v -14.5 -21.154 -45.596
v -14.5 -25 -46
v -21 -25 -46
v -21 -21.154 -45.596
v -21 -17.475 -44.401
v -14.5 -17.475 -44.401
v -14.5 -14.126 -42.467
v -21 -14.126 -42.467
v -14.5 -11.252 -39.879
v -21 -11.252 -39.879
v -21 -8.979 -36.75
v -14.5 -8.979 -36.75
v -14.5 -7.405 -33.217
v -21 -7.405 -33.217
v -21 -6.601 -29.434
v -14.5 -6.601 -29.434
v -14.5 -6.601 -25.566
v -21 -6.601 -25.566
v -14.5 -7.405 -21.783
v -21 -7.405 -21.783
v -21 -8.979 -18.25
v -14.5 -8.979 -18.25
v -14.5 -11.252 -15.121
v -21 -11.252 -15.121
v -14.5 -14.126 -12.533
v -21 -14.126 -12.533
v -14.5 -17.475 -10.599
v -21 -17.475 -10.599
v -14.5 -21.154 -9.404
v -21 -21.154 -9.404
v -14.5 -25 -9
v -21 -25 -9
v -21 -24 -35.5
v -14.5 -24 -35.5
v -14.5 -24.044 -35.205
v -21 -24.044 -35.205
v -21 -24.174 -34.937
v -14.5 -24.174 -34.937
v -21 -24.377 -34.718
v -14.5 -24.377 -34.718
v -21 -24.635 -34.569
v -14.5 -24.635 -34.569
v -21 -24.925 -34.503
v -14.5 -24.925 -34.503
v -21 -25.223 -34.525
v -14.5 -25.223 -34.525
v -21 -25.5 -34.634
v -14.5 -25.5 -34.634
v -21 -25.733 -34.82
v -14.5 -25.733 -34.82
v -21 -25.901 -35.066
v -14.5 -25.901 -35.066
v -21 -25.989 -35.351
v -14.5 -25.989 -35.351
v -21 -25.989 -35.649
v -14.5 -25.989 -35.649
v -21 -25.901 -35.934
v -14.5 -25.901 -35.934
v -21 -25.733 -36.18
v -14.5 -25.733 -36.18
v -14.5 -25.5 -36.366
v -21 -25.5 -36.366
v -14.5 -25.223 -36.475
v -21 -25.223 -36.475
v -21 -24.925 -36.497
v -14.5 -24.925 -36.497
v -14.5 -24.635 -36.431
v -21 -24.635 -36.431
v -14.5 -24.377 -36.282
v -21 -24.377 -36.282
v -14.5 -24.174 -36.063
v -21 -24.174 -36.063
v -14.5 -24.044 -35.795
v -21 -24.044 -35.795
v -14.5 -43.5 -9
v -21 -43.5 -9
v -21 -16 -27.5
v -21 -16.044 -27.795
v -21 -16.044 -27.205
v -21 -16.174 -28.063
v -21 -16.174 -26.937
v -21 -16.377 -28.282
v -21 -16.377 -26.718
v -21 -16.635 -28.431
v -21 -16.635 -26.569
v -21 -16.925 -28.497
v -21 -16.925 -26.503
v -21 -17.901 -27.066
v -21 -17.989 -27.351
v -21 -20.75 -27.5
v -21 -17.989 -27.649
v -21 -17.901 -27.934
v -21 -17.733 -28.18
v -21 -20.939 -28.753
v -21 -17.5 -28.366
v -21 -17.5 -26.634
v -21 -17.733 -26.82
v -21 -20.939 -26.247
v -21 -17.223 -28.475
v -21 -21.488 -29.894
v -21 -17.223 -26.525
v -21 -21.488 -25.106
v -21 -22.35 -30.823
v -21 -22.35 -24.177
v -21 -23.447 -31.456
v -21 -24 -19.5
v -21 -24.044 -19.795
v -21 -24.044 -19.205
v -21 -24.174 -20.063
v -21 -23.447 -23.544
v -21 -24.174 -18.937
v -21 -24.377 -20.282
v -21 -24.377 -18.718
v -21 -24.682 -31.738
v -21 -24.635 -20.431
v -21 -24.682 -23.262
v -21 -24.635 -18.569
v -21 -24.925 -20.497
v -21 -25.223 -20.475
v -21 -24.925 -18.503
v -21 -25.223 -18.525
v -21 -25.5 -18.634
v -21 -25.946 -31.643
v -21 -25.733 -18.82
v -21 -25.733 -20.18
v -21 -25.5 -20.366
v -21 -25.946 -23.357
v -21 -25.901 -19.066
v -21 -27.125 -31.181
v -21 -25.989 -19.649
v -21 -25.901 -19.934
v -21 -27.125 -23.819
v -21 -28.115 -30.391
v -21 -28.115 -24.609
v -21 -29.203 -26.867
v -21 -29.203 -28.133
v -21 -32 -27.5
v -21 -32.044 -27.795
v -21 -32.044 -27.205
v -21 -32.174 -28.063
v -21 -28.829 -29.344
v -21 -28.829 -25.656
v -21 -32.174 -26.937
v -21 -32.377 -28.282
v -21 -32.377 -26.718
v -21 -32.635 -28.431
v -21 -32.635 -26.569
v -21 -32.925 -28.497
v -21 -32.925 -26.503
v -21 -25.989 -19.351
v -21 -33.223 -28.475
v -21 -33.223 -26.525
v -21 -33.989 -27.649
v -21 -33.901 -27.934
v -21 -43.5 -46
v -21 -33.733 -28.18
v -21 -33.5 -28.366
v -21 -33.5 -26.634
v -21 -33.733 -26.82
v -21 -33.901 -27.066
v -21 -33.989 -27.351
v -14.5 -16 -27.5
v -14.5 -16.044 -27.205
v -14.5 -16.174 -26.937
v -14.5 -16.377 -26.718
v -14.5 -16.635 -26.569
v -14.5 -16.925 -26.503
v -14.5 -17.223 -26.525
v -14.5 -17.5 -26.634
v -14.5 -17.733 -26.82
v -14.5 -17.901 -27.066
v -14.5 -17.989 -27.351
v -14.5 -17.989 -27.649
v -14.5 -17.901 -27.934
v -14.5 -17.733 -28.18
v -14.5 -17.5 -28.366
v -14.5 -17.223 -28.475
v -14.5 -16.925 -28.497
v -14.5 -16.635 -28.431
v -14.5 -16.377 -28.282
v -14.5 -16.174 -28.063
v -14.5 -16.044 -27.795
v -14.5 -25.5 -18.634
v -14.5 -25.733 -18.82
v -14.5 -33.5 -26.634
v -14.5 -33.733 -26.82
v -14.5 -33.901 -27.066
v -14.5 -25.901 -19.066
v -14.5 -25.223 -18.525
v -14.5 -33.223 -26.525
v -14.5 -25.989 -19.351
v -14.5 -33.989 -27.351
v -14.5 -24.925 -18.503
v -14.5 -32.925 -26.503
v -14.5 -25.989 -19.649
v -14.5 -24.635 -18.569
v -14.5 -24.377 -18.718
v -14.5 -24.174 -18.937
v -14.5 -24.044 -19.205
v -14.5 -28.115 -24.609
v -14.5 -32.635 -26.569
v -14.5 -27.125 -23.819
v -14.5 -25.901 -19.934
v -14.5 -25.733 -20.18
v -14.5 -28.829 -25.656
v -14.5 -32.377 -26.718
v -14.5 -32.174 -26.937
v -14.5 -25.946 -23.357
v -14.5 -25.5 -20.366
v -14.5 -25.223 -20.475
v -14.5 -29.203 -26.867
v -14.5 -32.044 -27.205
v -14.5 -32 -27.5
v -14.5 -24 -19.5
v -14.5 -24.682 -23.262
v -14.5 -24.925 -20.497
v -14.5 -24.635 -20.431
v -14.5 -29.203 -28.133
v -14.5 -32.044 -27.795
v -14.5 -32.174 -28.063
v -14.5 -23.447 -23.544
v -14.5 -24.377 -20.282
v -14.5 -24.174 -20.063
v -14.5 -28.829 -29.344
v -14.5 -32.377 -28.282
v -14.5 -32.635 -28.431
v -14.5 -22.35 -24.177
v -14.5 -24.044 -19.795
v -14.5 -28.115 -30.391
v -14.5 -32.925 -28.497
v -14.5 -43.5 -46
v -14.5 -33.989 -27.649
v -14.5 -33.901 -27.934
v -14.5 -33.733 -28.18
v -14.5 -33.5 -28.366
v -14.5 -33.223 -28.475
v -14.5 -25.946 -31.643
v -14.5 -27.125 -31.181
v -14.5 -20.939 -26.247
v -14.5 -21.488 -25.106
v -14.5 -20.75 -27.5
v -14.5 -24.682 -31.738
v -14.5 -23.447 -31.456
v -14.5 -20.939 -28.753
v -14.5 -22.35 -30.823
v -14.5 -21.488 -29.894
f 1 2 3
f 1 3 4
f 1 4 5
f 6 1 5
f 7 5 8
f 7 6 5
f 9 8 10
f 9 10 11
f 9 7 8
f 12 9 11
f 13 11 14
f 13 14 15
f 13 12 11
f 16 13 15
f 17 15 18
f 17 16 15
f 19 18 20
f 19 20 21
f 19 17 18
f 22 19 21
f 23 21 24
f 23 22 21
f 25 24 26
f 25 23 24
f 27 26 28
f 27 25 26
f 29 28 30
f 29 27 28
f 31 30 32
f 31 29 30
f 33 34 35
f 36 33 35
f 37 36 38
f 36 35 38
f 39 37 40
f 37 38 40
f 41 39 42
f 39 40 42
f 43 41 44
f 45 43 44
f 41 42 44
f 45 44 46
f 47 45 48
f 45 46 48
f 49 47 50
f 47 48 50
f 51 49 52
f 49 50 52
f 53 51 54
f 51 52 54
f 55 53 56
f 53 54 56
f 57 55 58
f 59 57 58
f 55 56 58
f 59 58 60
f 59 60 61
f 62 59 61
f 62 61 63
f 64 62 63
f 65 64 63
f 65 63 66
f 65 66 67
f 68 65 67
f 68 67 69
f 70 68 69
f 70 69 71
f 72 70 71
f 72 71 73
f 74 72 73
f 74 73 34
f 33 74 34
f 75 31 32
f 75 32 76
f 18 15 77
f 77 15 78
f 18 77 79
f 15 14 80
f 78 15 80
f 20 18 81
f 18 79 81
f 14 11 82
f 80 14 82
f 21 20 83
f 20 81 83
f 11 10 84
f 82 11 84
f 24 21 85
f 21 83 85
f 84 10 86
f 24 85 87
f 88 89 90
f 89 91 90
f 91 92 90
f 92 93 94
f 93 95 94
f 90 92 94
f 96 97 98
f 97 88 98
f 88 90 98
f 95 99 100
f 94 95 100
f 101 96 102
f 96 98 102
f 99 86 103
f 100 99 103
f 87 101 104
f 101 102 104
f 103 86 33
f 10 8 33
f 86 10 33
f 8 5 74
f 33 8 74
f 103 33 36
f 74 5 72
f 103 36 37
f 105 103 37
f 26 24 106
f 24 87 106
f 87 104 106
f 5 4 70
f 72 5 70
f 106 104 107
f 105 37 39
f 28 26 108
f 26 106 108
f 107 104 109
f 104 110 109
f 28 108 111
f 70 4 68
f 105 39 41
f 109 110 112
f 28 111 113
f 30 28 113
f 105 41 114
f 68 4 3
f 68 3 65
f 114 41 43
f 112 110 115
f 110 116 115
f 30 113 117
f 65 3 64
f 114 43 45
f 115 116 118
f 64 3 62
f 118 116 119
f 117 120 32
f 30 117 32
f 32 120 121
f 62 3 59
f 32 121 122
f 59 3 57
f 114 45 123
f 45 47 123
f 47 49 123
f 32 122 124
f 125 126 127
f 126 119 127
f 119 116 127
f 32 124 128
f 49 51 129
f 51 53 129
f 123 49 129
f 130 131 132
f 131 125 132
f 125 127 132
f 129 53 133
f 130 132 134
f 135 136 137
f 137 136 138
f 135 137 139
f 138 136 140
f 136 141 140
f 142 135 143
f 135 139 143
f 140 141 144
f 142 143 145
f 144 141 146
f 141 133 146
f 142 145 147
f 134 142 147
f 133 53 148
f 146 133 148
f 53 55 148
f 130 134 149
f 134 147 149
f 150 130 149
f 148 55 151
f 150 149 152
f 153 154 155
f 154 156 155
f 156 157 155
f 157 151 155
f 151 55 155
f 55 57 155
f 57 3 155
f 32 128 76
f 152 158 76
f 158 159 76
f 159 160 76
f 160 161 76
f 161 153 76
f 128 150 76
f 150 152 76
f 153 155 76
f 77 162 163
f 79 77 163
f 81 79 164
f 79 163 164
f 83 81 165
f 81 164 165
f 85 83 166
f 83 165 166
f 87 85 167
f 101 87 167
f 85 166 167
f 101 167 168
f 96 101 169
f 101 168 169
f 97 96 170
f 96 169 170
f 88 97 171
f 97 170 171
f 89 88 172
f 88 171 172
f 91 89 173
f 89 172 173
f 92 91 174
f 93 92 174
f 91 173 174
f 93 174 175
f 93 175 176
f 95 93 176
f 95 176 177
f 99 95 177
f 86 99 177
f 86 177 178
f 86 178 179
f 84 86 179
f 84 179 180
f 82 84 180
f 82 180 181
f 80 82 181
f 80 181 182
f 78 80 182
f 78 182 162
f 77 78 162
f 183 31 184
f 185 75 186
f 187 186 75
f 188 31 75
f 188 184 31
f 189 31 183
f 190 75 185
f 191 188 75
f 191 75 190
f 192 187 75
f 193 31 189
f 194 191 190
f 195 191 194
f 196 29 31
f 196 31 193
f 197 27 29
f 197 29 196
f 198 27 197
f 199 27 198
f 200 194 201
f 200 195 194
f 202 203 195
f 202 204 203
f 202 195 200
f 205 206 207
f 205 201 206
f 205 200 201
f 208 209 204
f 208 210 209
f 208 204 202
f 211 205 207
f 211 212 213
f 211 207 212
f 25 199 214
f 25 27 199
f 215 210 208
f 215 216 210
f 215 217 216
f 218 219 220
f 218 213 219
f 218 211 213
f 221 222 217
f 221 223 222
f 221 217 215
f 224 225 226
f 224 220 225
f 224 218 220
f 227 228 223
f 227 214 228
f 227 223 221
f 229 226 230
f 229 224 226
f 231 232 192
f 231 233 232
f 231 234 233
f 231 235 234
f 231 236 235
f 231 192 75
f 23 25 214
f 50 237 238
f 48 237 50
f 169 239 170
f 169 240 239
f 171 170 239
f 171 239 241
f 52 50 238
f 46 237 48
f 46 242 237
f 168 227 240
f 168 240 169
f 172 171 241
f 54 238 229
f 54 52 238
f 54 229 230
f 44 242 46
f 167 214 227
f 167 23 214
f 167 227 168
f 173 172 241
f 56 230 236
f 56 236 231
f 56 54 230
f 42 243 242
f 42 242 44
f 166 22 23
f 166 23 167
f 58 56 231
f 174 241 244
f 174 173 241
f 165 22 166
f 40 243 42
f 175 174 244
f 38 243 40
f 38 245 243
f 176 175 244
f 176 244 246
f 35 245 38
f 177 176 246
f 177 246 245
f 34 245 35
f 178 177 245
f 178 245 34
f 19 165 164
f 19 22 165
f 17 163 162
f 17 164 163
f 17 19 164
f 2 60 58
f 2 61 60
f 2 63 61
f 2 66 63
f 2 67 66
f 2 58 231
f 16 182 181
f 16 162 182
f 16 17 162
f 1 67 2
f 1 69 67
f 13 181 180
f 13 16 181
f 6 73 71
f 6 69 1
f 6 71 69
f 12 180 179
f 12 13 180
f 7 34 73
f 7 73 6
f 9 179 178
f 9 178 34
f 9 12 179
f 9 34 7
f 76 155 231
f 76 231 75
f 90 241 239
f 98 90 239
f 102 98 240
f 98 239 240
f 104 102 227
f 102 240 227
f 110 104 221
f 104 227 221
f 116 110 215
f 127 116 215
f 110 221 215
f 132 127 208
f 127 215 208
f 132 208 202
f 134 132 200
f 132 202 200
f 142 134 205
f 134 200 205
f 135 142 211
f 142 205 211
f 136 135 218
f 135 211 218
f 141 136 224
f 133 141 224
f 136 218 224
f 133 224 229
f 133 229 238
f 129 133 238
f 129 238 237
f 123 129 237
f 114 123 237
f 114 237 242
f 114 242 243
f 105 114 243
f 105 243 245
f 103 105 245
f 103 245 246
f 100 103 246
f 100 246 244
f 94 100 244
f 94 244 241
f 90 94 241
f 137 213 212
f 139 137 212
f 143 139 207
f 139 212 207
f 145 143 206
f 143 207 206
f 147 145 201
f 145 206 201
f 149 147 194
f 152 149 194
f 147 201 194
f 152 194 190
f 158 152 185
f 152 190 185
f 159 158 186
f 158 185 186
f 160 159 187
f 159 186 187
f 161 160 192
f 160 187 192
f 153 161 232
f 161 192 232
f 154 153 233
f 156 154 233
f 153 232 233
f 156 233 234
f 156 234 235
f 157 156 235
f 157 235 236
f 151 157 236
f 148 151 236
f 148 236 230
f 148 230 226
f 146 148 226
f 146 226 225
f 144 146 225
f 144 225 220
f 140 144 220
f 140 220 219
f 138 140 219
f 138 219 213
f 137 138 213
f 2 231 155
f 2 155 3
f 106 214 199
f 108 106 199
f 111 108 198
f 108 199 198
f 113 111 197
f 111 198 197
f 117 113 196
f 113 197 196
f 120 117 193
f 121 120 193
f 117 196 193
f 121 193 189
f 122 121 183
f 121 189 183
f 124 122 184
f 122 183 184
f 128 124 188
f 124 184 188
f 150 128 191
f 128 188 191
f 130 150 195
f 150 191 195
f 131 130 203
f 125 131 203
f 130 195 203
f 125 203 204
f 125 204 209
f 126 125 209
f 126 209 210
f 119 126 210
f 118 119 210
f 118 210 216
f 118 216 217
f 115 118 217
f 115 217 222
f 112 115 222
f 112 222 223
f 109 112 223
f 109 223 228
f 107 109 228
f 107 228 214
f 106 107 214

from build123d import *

# Parameters (mm, degrees)
SKETCH1_W               = 50
SKETCH1_H               = 150
BOSS_EXTRUDE1_DEPTH     = 55
CUT_EXTRUDE1_DEPTH      = 168.406690428
CUT_EXTRUDE1_DEPTH_BACK = 45
SKETCH2_R               = 10.25
SKETCH7_R               = 1
SKETCH7_R_2             = 4.25
CUT_EXTRUDE3_DEPTH      = 10
SKETCH8_W               = 55
SKETCH8_H               = 55
SKETCH8_R               = 10.25
BOSS_EXTRUDE2_DEPTH     = 50
SKETCH10_W              = 8
SKETCH10_H              = 10.25
SKETCH10_W_2            = 17
SKETCH10_H_2            = 1
SKETCH10_W_3            = 34
SKETCH10_H_3            = 20
SKETCH10_H_4            = 5
CUT_EXTRUDE4_DEPTH      = 214.717102732
SKETCH11_W              = 34
SKETCH11_H              = 13.25
BOSS_EXTRUDE4_DEPTH     = 25
SKETCH13_W              = 55
SKETCH13_H              = 10
CUT_EXTRUDE5_DEPTH      = 8
SKETCH14_R              = 5.030159043
CUT_EXTRUDE6_DEPTH      = 8
SKETCH15_W              = 34
SKETCH15_H              = 0.25
BOSS_EXTRUDE5_DEPTH     = 13.25
CUT_EXTRUDE7_DEPTH      = 181.416185527
BOSS_EXTRUDE6_START     = 1.5
SKETCH19_R              = 10.25
SKETCH19_R_2            = 1
SKETCH19_R_3            = 4.25
BOSS_EXTRUDE6_DEPTH     = 1.5
CUT_EXTRUDE8_DEPTH      = 184.89467094
SKETCH21_R              = 5.030159043
SKETCH21_R_2            = 4.5
BOSS_EXTRUDE7_DEPTH     = 8
SKETCH24_W              = 4
SKETCH24_H              = 30
CUT_EXTRUDE10_DEPTH     = 181.416185527
SKETCH25_W              = 55
SKETCH25_H              = 86.25
CUT_EXTRUDE11_DEPTH     = 4
BOSS_EXTRUDE8_START     = 4
SKETCH26_R              = 1
SKETCH26_R_2            = 4.25
BOSS_EXTRUDE8_DEPTH     = 4
SKETCH27_W              = 4
SKETCH27_H              = 123.25
CUT_EXTRUDE12_DEPTH     = 181.416185527
CUT_EXTRUDE13_DEPTH     = 180.905530765
SKETCH29_W              = 42
SKETCH29_H              = 9
CUT_EXTRUDE15_DEPTH     = 174.776436838
SKETCH30_R              = 4.5
SKETCH30_R_2            = 1.45
BOSS_EXTRUDE9_DEPTH     = 4
SKETCH31_W              = 37
SKETCH31_H              = 55
CUT_EXTRUDE16_DEPTH     = 182.05247858
SKETCH32_W              = 73.968301754
SKETCH32_H              = 92.223299302
CUT_EXTRUDE17_DEPTH     = 182.05247858


with BuildPart() as part:
    # Sketch1 → Boss-Extrude1 (new body)
    with BuildSketch(Plane.XY):
        with Locations((0, -75)):
            Rectangle(SKETCH1_W, SKETCH1_H)
    extrude(amount=-BOSS_EXTRUDE1_DEPTH)

    # Sketch2 → Cut-Extrude1 (cut, two sides: drawn at the far end of the back side and taken through both)
    with BuildSketch(Plane(origin=(25, 0, 0), x_dir=(0, 0, -1), z_dir=(1, 0, 0)).offset(-CUT_EXTRUDE1_DEPTH_BACK)):
        with Locations(Location((27.5, -25, 0), (0, 0, 270))):
            Circle(SKETCH2_R)
    extrude(amount=CUT_EXTRUDE1_DEPTH + CUT_EXTRUDE1_DEPTH_BACK, mode=Mode.SUBTRACT)

    # Sketch7 → Cut-Extrude3 (cut)
    with BuildSketch(Plane(origin=(-20, 0, 0), x_dir=(0, 0, -1), z_dir=(1, 0, 0))):
        with Locations(Location((27.5, -17, 0), (0, 0, 90))):
            Circle(SKETCH7_R)
        with Locations(Location((35.5, -25, 0), (0, 0, 90))):
            Circle(SKETCH7_R)
        with Locations(Location((27.5, -33, 0), (0, 0, 90))):
            Circle(SKETCH7_R)
        with Locations(Location((19.5, -25, 0), (0, 0, 90))):
            Circle(SKETCH7_R)
        with Locations(Location((27.5, -25, 0), (0, 0, 90))):
            Circle(SKETCH7_R_2)
    extrude(amount=-CUT_EXTRUDE3_DEPTH, mode=Mode.SUBTRACT)

    # Sketch8 → Boss-Extrude2 (add)
    with BuildSketch(Plane(origin=(25, 0, 0), x_dir=(0, 0, -1), z_dir=(1, 0, 0))):
        with Locations((27.5, -177.5)):
            Rectangle(SKETCH8_W, SKETCH8_H)
        with Locations(Location((27.5, -180, 0), (0, 0, 90))):
            Circle(SKETCH8_R, mode=Mode.SUBTRACT)
    extrude(amount=-BOSS_EXTRUDE2_DEPTH)

    # Sketch10 → Cut-Extrude4 (cut, through all)
    with BuildSketch(Plane.XY):
        Polygon((-17, -205), (17, -205), (17, -191.25), (0, -191.25), (-17, -191.25), align=None)
        Polygon((-25, -205), (-17, -205), (-17, -191.25), (-17, -190.25), (-25, -190.25), align=None)
        Polygon((17, -191.25), (17, -205), (25, -205), (25, -190.25), (17, -190.25), align=None)
        with Locations((-21, -185.125)):
            Rectangle(SKETCH10_W, SKETCH10_H)
        with Locations((-21, -174.875)):
            Rectangle(SKETCH10_W, SKETCH10_H)
        with Locations((21, -174.875)):
            Rectangle(SKETCH10_W, SKETCH10_H)
        with Locations((21, -185.125)):
            Rectangle(SKETCH10_W, SKETCH10_H)
        with Locations((-8.5, -185.125)):
            Rectangle(SKETCH10_W_2, SKETCH10_H)
        with Locations((8.5, -185.125)):
            Rectangle(SKETCH10_W_2, SKETCH10_H)
        Polygon((0, -180), (17, -180), (17, -169.75), (-17, -169.75), (-17, -180), align=None)
        with Locations((-8.5, -190.75)):
            Rectangle(SKETCH10_W_2, SKETCH10_H_2)
        with Locations((8.5, -190.75)):
            Rectangle(SKETCH10_W_2, SKETCH10_H_2)
        with Locations((0, -154.75)):
            Rectangle(SKETCH10_W_3, SKETCH10_H_3)
        with Locations((0, -167.25)):
            Rectangle(SKETCH10_W_3, SKETCH10_H_4)
    extrude(amount=-CUT_EXTRUDE4_DEPTH, mode=Mode.SUBTRACT)

    # Sketch11 → Boss-Extrude4 (add)
    with BuildSketch(Plane.XZ.offset(144.75)):
        with Locations((0, -6.625)):
            Rectangle(SKETCH11_W, SKETCH11_H)
        with Locations((0, -48.375)):
            Rectangle(SKETCH11_W, SKETCH11_H)
    extrude(amount=BOSS_EXTRUDE4_DEPTH)

    # Sketch13 → Cut-Extrude5 (cut)
    with BuildSketch(Plane(origin=(25, 0, 0), x_dir=(0, 0, -1), z_dir=(1, 0, 0))):
        with Locations((27.5, -164.75)):
            Rectangle(SKETCH13_W, SKETCH13_H)
    cut_extrude5 = extrude(amount=-CUT_EXTRUDE5_DEPTH, mode=Mode.SUBTRACT)

    # Mirror2: Cut-Extrude5 across plane
    add(cut_extrude5.mirror(Plane(origin=(0, 0, 0), x_dir=(0, 0, 1), z_dir=(1, 0, 0))), mode=Mode.SUBTRACT)

    # Sketch14 → Cut-Extrude6 (cut)
    with BuildSketch(Plane(origin=(25, 0, 0), x_dir=(0, 0, -1), z_dir=(1, 0, 0))):
        with Locations(Location((16.5, -148, 0), (0, 0, 90))):
            Circle(SKETCH14_R)
        with Locations(Location((38.5, -148, 0), (0, 0, 90))):
            Circle(SKETCH14_R)
    cut_extrude6 = extrude(amount=-CUT_EXTRUDE6_DEPTH, mode=Mode.SUBTRACT)

    # Mirror3: Cut-Extrude6 across plane
    add(cut_extrude6.mirror(Plane(origin=(0, 0, 0), x_dir=(0, 0, 1), z_dir=(1, 0, 0))), mode=Mode.SUBTRACT)

    # Sketch15 → Boss-Extrude5 (add)
    with BuildSketch(Plane.XY):
        with Locations((0, -169.875)):
            Rectangle(SKETCH15_W, SKETCH15_H)
    boss_extrude5 = extrude(amount=-BOSS_EXTRUDE5_DEPTH)

    # Mirror4: Boss-Extrude5 across plane
    add(boss_extrude5.mirror(Plane.XY.offset(-27.5)))

    # Sketch16 → Cut-Extrude7 (cut, through all)
    with BuildSketch(Plane.XY):
        Polygon((-18.5, 0), (-18.5, -14.75), (-18.5, -35.25), (-18.5, -43.5), (25, -43.5), (25, 0), align=None)
    extrude(amount=-CUT_EXTRUDE7_DEPTH, mode=Mode.SUBTRACT)

    # Sketch19 → Boss-Extrude6 (add)
    with BuildSketch(Plane(origin=(-20, 0, 0), x_dir=(0, 0, -1), z_dir=(1, 0, 0)).offset(BOSS_EXTRUDE6_START)):
        with Locations((27.5, -25)):
            Circle(SKETCH19_R)
        with Locations(Location((27.5, -17, 0), (0, 0, 90))):
            Circle(SKETCH19_R_2, mode=Mode.SUBTRACT)
        with Locations(Location((27.5, -33, 0), (0, 0, 90))):
            Circle(SKETCH19_R_2, mode=Mode.SUBTRACT)
        with Locations(Location((19.5, -25, 0), (0, 0, 90))):
            Circle(SKETCH19_R_2, mode=Mode.SUBTRACT)
        with Locations(Location((35.5, -25, 0), (0, 0, 90))):
            Circle(SKETCH19_R_2, mode=Mode.SUBTRACT)
        with Locations(Location((27.5, -25, 0), (0, 0, 90))):
            Circle(SKETCH19_R_3, mode=Mode.SUBTRACT)
    extrude(amount=-BOSS_EXTRUDE6_DEPTH)

    # Sketch20 → Cut-Extrude8 (cut, through all)
    with BuildSketch(Plane(origin=(-18.5, 0, 0), x_dir=(0, 0, -1), z_dir=(1, 0, 0))):
        with BuildLine():
            Line((0, 0), (0, -43.5))
            Line((0, -43.5), (9, -43.5))
            Line((9, -43.5), (9, -25))
            ThreePointArc((9, -25), (27.5, -6.5), (46, -25))
            Line((46, -25), (46, -43.5))
            Line((46, -43.5), (55, -43.5))
            Line((55, -43.5), (55, 0))
            Line((55, 0), (0, 0))
        make_face()
    extrude(amount=-CUT_EXTRUDE8_DEPTH, mode=Mode.SUBTRACT)

    # Sketch21 → Boss-Extrude7 (add)
    # profile 1 of 2: a face of its own
    with BuildSketch(Plane(origin=(25, 0, 0), x_dir=(0, 0, -1), z_dir=(1, 0, 0))):
        with Locations(Location((16.5, -148, 0), (0, 0, 229.751587581))):
            Circle(SKETCH21_R)
        with Locations(Location((16.5, -148, 0), (0, 0, 90))):
            Circle(SKETCH21_R_2, mode=Mode.SUBTRACT)
    # profile 2 of 2: a face of its own
    with BuildSketch(Plane(origin=(25, 0, 0), x_dir=(0, 0, -1), z_dir=(1, 0, 0))):
        with Locations(Location((38.5, -148, 0), (0, 0, 310.248412419))):
            Circle(SKETCH21_R)
        with Locations(Location((38.5, -148, 0), (0, 0, 90))):
            Circle(SKETCH21_R_2, mode=Mode.SUBTRACT)
    boss_extrude7 = extrude(amount=-BOSS_EXTRUDE7_DEPTH)

    # Mirror5: Boss-Extrude7 across plane
    add(boss_extrude7.mirror(Plane(origin=(0, 0, 0), x_dir=(0, 0, 1), z_dir=(1, 0, 0))))

    # Sketch24 → Cut-Extrude10 (cut, through all)
    with BuildSketch(Plane.XY):
        with Locations((-23, -144.75)):
            Rectangle(SKETCH24_W, SKETCH24_H)
        with Locations((23, -144.75)):
            Rectangle(SKETCH24_W, SKETCH24_H)
    extrude(amount=-CUT_EXTRUDE10_DEPTH, mode=Mode.SUBTRACT)

    # Sketch25 → Cut-Extrude11 (cut)
    with BuildSketch(Plane(origin=(25, 0, 0), x_dir=(0, 0, -1), z_dir=(1, 0, 0))):
        with Locations((27.5, -86.625)):
            Rectangle(SKETCH25_W, SKETCH25_H)
    extrude(amount=-CUT_EXTRUDE11_DEPTH, mode=Mode.SUBTRACT)

    # Sketch26 → Boss-Extrude8 (add)
    with BuildSketch(Plane(origin=(-18.5, 0, 0), x_dir=(0, 0, -1), z_dir=(1, 0, 0)).offset(BOSS_EXTRUDE8_START)):
        with BuildLine():
            Line((46, -43.5), (46, -25))
            ThreePointArc((46, -25), (27.5, -6.5), (9, -25))
            Line((9, -25), (9, -43.5))
            Line((9, -43.5), (46, -43.5))
        make_face()
        with Locations(Location((35.5, -25, 0), (0, 0, 90))):
            Circle(SKETCH26_R, mode=Mode.SUBTRACT)
        with Locations(Location((27.5, -25, 0), (0, 0, 90))):
            Circle(SKETCH26_R_2, mode=Mode.SUBTRACT)
        with Locations(Location((19.5, -25, 0), (0, 0, 90))):
            Circle(SKETCH26_R, mode=Mode.SUBTRACT)
        with Locations(Location((27.5, -33, 0), (0, 0, 90))):
            Circle(SKETCH26_R, mode=Mode.SUBTRACT)
        with Locations(Location((27.5, -17, 0), (0, 0, 90))):
            Circle(SKETCH26_R, mode=Mode.SUBTRACT)
    extrude(amount=-BOSS_EXTRUDE8_DEPTH)

    # Sketch27 → Cut-Extrude12 (cut, through all)
    with BuildSketch(Plane.XY):
        with Locations((-23, -68.125)):
            Rectangle(SKETCH27_W, SKETCH27_H)
    extrude(amount=-CUT_EXTRUDE12_DEPTH, mode=Mode.SUBTRACT)

    # Sketch28 → Cut-Extrude13 (cut, through all)
    with BuildSketch(Plane.XY):
        with BuildLine():
            Line((21, -43.5), (-14.5, -43.5))
            ThreePointArc((-14.5, -43.5), (10.602290732, -53.897709268), (21, -79))
            Line((21, -79), (21, -43.5))
        make_face()
    extrude(amount=-CUT_EXTRUDE13_DEPTH, mode=Mode.SUBTRACT)

    # Sketch29 → Cut-Extrude15 (cut, through all)
    with BuildSketch(Plane.XZ.offset(170)):
        with Locations((0, -50.5)):
            Rectangle(SKETCH29_W, SKETCH29_H)
        with Locations((0, -4.5)):
            Rectangle(SKETCH29_W, SKETCH29_H)
    extrude(amount=-CUT_EXTRUDE15_DEPTH, mode=Mode.SUBTRACT)

    # Sketch30 → Boss-Extrude9 (add)
    # profile 1 of 2: a face of its own
    with BuildSketch(Plane(origin=(21, 0, 0), x_dir=(0, 0, -1), z_dir=(1, 0, 0))):
        with Locations(Location((16.5, -148, 0), (0, 0, 223.761742693))):
            Circle(SKETCH30_R)
        with Locations((16.5, -148)):
            Circle(SKETCH30_R_2, mode=Mode.SUBTRACT)
    # profile 2 of 2: a face of its own
    with BuildSketch(Plane(origin=(21, 0, 0), x_dir=(0, 0, -1), z_dir=(1, 0, 0))):
        with Locations(Location((38.5, -148, 0), (0, 0, 316.238257307))):
            Circle(SKETCH30_R)
        with Locations((38.5, -148)):
            Circle(SKETCH30_R_2, mode=Mode.SUBTRACT)
    boss_extrude9 = extrude(amount=-BOSS_EXTRUDE9_DEPTH)

    # Mirror6: Boss-Extrude9 across plane
    add(boss_extrude9.mirror(Plane(origin=(0, 0, 0), x_dir=(0, 0, 1), z_dir=(1, 0, 0))))

    # Sketch31 → Cut-Extrude16 (cut, through all)
    with BuildSketch(Plane.ZY.offset(21)):
        with Locations((-27.5, -71)):
            Rectangle(SKETCH31_W, SKETCH31_H)
    extrude(amount=-CUT_EXTRUDE16_DEPTH, mode=Mode.SUBTRACT)


with BuildPart() as cut_extrude16_piece_1:
    # of the separate pieces the step leaves, piece 1, a body of its own (cut_extrude16_pieces)
    add(part.part.solids().sort_by_distance((17, -170, -13.25))[0])

    # Sketch32 → Cut-Extrude17 (cut, through all)
    with BuildSketch(Plane.ZY.offset(21)):
        with Locations((-28.833527464, -129.267729309)):
            Rectangle(SKETCH32_W, SKETCH32_H)
    extrude(amount=-CUT_EXTRUDE17_DEPTH, mode=Mode.SUBTRACT)


with BuildPart() as cut_extrude16_piece_2:
    # of the separate pieces the step leaves, piece 2, a body of its own (cut_extrude16_pieces)
    add(part.part.solids().sort_by_distance((-21, -43.5, -9))[0])


solid = cut_extrude16_piece_2.part
